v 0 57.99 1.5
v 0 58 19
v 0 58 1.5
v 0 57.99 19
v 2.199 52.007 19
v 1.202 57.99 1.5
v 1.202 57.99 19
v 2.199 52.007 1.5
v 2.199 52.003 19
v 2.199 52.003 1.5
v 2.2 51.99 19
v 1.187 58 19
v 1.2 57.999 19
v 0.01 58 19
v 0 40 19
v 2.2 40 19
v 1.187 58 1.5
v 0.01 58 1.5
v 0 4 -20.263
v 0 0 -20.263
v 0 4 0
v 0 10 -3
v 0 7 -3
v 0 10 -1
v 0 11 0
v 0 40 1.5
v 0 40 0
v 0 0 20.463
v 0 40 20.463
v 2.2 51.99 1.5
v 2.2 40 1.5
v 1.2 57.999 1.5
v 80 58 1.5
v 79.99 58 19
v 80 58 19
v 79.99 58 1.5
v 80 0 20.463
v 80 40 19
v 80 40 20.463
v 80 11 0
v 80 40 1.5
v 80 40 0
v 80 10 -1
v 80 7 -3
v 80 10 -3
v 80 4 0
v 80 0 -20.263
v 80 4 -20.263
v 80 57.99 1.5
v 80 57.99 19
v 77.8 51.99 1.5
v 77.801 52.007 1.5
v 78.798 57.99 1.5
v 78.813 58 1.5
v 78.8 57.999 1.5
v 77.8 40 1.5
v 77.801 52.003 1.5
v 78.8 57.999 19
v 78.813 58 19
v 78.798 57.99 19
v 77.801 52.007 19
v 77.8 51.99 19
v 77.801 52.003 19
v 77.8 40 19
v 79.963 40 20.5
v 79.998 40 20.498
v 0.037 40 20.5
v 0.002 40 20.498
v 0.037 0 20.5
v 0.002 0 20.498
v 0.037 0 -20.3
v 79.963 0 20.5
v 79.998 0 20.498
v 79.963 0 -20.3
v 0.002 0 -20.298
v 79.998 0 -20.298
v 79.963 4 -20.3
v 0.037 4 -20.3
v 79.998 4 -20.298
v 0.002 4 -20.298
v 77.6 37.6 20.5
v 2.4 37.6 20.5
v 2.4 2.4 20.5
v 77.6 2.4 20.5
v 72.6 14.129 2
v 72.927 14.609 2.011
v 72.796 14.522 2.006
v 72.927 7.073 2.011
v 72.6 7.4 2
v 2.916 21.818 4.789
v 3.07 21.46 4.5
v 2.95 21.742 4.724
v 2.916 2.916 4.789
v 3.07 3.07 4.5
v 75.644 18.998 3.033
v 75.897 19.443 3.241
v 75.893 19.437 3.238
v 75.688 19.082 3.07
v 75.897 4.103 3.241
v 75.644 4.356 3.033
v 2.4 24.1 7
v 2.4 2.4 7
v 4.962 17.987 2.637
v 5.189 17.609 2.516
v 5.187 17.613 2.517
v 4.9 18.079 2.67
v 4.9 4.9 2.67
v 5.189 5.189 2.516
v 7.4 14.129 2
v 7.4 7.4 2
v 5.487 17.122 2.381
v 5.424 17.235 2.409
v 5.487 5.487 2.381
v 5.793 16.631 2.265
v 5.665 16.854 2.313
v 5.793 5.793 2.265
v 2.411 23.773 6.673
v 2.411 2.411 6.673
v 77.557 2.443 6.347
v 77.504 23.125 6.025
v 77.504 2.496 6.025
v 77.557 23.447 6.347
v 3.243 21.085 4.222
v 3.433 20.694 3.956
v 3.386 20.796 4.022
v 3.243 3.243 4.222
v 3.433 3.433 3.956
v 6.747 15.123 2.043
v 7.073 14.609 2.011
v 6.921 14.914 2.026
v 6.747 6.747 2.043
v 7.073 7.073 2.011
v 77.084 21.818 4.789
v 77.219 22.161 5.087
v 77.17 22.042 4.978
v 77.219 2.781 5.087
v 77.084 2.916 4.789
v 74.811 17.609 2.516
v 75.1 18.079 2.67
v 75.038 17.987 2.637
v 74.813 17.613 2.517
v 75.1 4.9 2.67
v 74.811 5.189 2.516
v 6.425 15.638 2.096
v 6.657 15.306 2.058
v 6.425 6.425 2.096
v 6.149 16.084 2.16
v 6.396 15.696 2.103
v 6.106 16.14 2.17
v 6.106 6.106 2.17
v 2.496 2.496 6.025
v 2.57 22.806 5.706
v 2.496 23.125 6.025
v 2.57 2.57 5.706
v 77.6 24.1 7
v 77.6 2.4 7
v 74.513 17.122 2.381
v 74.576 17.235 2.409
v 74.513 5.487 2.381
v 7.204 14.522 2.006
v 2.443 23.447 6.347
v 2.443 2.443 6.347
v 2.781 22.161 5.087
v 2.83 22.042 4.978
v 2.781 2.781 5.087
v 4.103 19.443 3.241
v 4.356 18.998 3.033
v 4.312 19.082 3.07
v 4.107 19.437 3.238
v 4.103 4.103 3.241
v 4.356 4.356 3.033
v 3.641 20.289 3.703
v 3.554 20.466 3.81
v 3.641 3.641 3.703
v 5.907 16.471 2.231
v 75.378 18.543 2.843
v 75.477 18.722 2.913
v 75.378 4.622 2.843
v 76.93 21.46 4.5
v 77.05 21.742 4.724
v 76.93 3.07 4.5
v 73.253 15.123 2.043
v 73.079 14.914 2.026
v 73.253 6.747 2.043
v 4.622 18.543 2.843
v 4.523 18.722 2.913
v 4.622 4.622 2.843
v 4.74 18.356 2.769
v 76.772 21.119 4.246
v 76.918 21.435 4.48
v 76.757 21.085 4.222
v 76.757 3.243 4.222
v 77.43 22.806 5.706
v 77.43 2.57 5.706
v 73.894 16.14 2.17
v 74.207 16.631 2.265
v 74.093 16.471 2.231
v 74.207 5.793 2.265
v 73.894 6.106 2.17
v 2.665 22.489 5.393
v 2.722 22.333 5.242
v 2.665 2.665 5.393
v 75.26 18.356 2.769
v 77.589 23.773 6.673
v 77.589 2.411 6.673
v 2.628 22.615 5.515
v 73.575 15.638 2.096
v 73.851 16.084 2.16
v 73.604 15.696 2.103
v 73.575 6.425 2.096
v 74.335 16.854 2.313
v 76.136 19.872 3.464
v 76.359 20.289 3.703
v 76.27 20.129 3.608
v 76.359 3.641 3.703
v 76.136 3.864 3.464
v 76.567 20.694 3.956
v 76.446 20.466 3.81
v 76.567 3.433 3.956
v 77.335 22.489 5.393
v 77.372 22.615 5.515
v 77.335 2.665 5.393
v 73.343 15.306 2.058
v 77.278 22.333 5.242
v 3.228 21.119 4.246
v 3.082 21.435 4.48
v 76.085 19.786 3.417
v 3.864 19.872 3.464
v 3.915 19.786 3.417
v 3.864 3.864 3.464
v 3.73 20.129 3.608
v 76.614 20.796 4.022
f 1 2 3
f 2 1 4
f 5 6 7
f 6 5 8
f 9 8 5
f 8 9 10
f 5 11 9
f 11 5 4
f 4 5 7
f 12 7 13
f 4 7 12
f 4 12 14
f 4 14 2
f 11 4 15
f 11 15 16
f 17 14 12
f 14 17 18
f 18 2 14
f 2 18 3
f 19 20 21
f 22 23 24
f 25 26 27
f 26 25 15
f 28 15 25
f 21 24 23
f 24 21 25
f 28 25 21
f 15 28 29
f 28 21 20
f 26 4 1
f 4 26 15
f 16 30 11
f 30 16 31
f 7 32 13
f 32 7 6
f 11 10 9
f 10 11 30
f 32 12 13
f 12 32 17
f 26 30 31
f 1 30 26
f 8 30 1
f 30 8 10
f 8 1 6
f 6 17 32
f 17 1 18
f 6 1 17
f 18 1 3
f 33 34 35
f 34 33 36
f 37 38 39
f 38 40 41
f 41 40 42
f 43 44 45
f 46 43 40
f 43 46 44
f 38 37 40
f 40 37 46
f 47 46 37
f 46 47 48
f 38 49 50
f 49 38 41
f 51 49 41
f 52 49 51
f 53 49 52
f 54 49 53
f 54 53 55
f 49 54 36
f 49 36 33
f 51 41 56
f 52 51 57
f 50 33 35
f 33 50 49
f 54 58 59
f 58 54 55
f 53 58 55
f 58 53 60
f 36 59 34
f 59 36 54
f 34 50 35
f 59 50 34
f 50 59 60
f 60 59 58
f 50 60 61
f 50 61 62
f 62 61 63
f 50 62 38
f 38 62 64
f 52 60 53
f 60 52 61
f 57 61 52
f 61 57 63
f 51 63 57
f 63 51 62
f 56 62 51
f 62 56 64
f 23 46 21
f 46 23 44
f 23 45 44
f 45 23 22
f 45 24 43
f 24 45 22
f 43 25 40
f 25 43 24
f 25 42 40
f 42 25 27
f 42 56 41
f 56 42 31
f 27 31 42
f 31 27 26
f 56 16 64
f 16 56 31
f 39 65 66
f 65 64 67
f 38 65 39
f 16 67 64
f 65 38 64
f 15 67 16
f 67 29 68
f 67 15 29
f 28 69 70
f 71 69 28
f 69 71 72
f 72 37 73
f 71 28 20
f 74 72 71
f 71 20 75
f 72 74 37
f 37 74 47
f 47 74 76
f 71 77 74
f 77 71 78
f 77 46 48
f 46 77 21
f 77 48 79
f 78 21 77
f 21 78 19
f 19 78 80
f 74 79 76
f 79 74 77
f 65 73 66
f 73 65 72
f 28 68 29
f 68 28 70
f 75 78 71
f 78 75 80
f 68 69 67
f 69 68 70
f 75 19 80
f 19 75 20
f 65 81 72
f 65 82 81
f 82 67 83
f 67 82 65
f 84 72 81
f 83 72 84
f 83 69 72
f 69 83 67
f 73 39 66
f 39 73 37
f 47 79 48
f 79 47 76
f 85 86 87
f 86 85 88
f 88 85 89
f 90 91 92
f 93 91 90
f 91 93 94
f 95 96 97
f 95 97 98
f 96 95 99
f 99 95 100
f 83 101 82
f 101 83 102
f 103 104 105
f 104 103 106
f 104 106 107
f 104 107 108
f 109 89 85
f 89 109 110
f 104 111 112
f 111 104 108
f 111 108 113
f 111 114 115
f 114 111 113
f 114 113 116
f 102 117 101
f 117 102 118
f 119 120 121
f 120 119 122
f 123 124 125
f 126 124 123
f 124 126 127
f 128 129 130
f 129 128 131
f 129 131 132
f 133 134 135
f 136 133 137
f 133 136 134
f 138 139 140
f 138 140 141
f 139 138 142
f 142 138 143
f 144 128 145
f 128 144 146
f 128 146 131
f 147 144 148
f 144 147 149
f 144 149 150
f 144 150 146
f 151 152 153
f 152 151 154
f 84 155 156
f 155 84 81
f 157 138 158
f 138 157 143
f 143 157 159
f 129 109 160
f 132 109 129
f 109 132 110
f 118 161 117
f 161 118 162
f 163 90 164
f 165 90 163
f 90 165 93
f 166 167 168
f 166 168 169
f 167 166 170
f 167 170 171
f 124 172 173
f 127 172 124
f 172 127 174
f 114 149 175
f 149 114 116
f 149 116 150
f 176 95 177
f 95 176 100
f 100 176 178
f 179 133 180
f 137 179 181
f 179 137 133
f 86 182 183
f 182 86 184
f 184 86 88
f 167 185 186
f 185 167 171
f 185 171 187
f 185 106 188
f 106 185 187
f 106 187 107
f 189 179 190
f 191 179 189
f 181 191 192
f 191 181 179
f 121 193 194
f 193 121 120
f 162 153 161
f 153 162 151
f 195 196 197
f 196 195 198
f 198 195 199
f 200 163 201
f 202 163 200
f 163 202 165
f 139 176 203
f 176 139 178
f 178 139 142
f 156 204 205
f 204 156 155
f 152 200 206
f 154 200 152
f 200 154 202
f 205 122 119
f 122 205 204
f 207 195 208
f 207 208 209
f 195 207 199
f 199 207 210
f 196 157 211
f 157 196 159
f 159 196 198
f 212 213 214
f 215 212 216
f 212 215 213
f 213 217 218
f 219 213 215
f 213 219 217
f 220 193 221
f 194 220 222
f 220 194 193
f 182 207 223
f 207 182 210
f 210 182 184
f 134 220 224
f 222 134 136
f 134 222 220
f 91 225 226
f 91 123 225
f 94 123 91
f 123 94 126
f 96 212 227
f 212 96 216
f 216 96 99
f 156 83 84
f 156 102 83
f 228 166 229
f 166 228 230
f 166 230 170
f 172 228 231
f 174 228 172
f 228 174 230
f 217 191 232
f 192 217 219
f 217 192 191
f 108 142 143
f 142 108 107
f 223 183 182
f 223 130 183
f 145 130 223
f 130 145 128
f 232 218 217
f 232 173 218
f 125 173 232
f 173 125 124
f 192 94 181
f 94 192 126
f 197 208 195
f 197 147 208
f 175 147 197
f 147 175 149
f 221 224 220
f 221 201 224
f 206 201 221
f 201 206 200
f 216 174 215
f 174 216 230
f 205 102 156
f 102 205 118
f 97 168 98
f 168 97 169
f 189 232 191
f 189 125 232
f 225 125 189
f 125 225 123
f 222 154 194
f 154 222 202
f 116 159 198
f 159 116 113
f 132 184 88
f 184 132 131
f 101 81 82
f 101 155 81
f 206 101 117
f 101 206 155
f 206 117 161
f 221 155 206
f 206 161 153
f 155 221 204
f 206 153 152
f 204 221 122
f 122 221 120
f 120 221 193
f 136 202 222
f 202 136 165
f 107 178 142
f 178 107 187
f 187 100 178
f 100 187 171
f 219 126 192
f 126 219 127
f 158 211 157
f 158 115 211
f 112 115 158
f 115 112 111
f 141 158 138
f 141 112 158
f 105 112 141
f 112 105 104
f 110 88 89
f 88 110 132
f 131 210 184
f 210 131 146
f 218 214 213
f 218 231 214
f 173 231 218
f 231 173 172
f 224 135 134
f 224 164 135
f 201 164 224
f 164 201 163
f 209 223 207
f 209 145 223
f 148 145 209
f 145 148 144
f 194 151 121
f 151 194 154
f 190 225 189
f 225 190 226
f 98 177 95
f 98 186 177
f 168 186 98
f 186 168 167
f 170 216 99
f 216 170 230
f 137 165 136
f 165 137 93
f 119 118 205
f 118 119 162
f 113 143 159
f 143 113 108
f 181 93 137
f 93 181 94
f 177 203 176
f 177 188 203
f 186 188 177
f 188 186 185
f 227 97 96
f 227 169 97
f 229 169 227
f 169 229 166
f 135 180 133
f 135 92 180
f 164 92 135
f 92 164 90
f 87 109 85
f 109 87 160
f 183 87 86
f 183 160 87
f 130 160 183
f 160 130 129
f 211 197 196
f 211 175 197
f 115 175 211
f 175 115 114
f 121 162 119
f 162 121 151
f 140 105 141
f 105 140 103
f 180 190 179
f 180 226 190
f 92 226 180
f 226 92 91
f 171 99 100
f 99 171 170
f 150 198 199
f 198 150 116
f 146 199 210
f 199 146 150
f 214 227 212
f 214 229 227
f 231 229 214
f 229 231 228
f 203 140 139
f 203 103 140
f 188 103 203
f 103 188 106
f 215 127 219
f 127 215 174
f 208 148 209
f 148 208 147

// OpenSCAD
// ============================================================================
//  Coffee spill tray for the internet connected coffee pot scale
//
//  A shallow open trough that catches the drips that run down the pot and out
//  across the plate. It rests on the free part of the teak plate in front of the
//  load cell holder and reaches plate_depth mm in towards the holder. The front
//  overhang mm stick out past the front edge of the plate, so drips that run all
//  the way over the edge are caught too instead of ending up on the table.
//
//  The load cell sits up inside the big grey cup the pot stands in, so the teak
//  plate and the table are both dead support below the measuring path. The tray
//  may therefore rest on the table as well, and that is what it does: the front
//  wall carries on down past the plate edge and stands on the table, which
//  stiffens the overhang. Three things hold the tray on the rig:
//
//    * a tongue behind the leg, hanging down in front of the front face of the
//      plate, so the tray cannot slide backwards towards the pot
//    * two spring arms reaching backwards from the rear face, one along each
//      side of the grey printed socle that carries the sensor, gripping it by
//      friction when the tray is pushed on
//    * its own weight on the plate
//
//  THE GREY SOCLE is the fixed 3D printed block standing on the teak plate
//  behind the tray: socle_width mm wide, socle_height mm up from the plate and
//  deep. That is what the arms grip - the sides of a block that stands up above
//  the plate - so the arms simply continue the side walls backwards, set in
//  (tray_width - socle_width) / 2 mm from the sides of the tray. The tray
//  therefore stays exactly tray_width mm wide.
//
//  PRINT ORIENTATION: on the front face (mode = "print"), so the print axis runs
//  backwards along the depth of the tray. That is what makes the arms possible.
//  Both gripping faces are planes at constant x; standing the part on a short end
//  would put the print axis along x, turning those planes into layer planes, and
//  the inner face of the upper arm into a ceiling hanging over nothing. Standing
//  the tray upright is worse: the whole underside would be a ceiling 30 x 80 mm
//  in the air above the leg.
//
//  Lying on the front face, every face that has to be vertical runs parallel to
//  the print axis, and the whole front face is the first layer. Only two surfaces
//  face the bed, and both are dealt with at 45 degrees, the steepest overhang
//  that prints without support:
//
//    * the inside of the rear wall - the floor rises to the rim over a fillet of
//      radius rear_fillet, from horizontal up to 45 degrees, and then a straight
//      45 degree run. This also makes the trough deepest at the front, so a spill
//      collects out over the table edge, away from the rig.
//    * the front face of the locating tongue - chamfered at 45 degrees
//
//  The short ends need no such treatment in this orientation - they are prisms
//  along the print axis - so their inside is a plain fillet and the flat floor
//  keeps its full width.
//
//  The STL files are written like this - see README.md for the reasoning:
//
//    openscad -o stl/coffee_spill_mug.stl -D 'mode="print"' coffee_spill_mug.scad
//    openscad -o stl/coffee_spill_mug_gauge.stl       -D 'mode="gauge"'       coffee_spill_mug.scad
//    openscad -o stl/coffee_spill_mug_gauge_clamp.stl -D 'mode="gauge_clamp"' coffee_spill_mug.scad
//    openscad -o stl/coffee_spill_mug_clip.stl        -D 'mode="clip"'        coffee_spill_mug.scad
//
//  Origin: x = 0 is the left side of the tray body, y = 0 is the front face (the
//  one out over the table), z = 0 is the top surface of the plate and
//  z = -plate_height is the table. All units in mm.
// ============================================================================

/* [Main dimensions] */
tray_width  = 80;   // body width, along the front edge of the plate, and the
                    // widest point of the whole part: the spring arms are set in
                    // from the sides, they do not stand outside them.
plate_depth = 30;   // how far in on the plate the tray reaches, measured from
                    // the front edge of the plate towards the sensor holder
tray_height = 20.5; // height of the rim above the plate surface. The grey socle
                    // is socle_height = 22 mm, and there are several mm of air
                    // from its top up to the big grey cup the pot stands in, so
                    // the rim has room to spare. Fitted with the 2 mm gauge.
overhang    = 10;   // how far the tray sticks out past the front edge of the plate

/* [The rig we clamp on to] */
// The grey 3D printed socle that carries the sensor, standing on the teak plate
// right behind the tray. Measured with the caliper.
socle_width  = 76;  // across, at the front face of the socle
socle_height = 22;  // up from the top of the teak plate
socle_depth  = 76;  // backwards - not measured exactly, "a lot", about this

/* [Wall thickness] */
wall_t  = 2.4;      // side, front and rear walls
floor_t = 2.0;      // floor of the trough (the part lying on the plate)

/* [Inside of the trough] */
// The inside of the rear wall faces the bed when printed, so the floor rises to
// the rim there over rear_fillet plus a straight 45 degree run. That costs
// (tray_height - floor_t) + 0.41 * rear_fillet mm of the depth. The front wall
// and the two short ends only get inner_fillet, a plain rounding that makes the
// trough easy to wipe out - no 45 degree run needed, none of those surfaces
// faces the bed.
rear_fillet  = 12;
inner_fillet = 5;
arc_steps    = 24;  // facets in the fillets

/* [Leg down to the table] */
// The front wall carries on down past the front edge of the plate and stands on
// the table, so the overhang is supported instead of cantilevered. plate_height
// is measured from the table up to the top surface of the teak plate. foot_clear
// shortens the leg a little: the tray pivots on the plate edge, so a leg that is
// e mm too long lifts the rear edge by 3 e mm and eats into the clearance under
// the grey cup. 0.3 mm is enough that the leg still takes over as soon as
// anything presses on the overhang.
//
// NOTE: the teak plate itself measures 19 mm thick. plate_height is 1.6 mm more
// than that because it was fitted with the printed gauge - the plate does not
// lie flat on the table. If the new gauge shows the leg standing the tray on its
// heel, set plate_height = 19.3.
leg_enable   = true;
plate_height = 20.6;
foot_clear   = 0.3;
leg_t        = 4;   // thickness of the leg below the plate. Thicker than the
                    // front wall on purpose: with edge_r = 1.5 a 2.4 mm leg
                    // would be rounded away to a knife edge against the table,
                    // 4 mm leaves a flat foot to bear on.

/* [Locating tongue at the plate edge] */
// A short tongue behind the leg, hanging down in front of the front face of the
// plate, so the tray cannot slide backwards towards the pot. Its front face
// would be a ceiling in the print, so it is chamfered at 45 degrees. The chamfer
// starts at the back of the leg, which caps hook_depth at hook_front - leg_t.
hook_enable = true;
hook_depth  = 3;
hook_t      = 3;    // thickness of the tongue
hook_relief = 1.0;  // 45 degree relief in the inner corner, so a rounded or
                    // slightly chamfered plate edge still seats fully

/* [Side spring clamps] */
// One on each side: the side wall carried on backwards past the rear face as a
// leaf spring clamp_len mm long, clamp_t mm thick, standing along the side of the
// grey socle. The outer face is flush with the side of the tray and the inner
// face is the gripping face, so the pair of them is clamp_squeeze mm narrower
// than the socle and has to spread to let it in.
//
// Bending happens over the whole free length, which is what makes the grip
// springy instead of brittle: about 3.2 N per side at the numbers below, with a
// peak stress around 4 MPa - a twelfth of what PETG takes. clamp_squeeze is the
// total interference over both sides and is the number to tune if the grip is
// too weak or the tray is too hard to push on.
//
// The gripping face is relieved clamp_lead mm at the free end and closes in on
// the socle over clamp_lead_y mm, so the front corners of the socle wedge the
// arms apart instead of hitting them head on.
clamp_enable  = true;
clamp_squeeze = 0.4;    // total, i.e. clamp_squeeze / 2 per side
clamp_t       = 2.2;    // thickness of the arm - this is the spring. Equal to
                        // (tray_width - socle_width + clamp_squeeze) / 2 makes
                        // the outer face flush with the side of the tray.
clamp_len     = 18;     // free length backwards from the rear face
clamp_z0      = 1.5;    // the arm starts this far above the plate, to clear any
                        // fillet or elephant foot at the base of the socle
clamp_h       = 19;     // top of the arm above the plate = tray_height - edge_r.
                        // Any higher and the rounding of the rim would thin the
                        // top of the arm down to a knife edge.
clamp_lead    = 1.0;    // relief of the gripping face at the free end
clamp_lead_y  = 6;      // ... closing in on the socle over this length
clamp_r       = 0.4;    // rounding of the free end of the arm

/* [Rim] */
edge_r = 1.5;       // rounding of the four long outer edges. The front and rear
                    // faces are left sharp on purpose: the front face is the
                    // first layer and wants full contact with the bed.

/* [View] */
// "use"    = as it sits on the plate (z = 0 is the plate surface)
// "print"  = lying on the front face, ready for the slicer
// "check"  = as "use", with the plate, the grey socle and the table as ghosts
// "gauge"  = a thin slice of the cross section, lying flat, ready for the slicer
// "gauge_clamp" = the top clamp_gauge_t mm of the tray, i.e. the rim and the two
//            arms: the cheap check that the arms straddle the socle
// "clip"   = the rear clip_back mm of the tray plus both complete arms, in print
//            orientation: the real friction test - see README.md
// "cavity" = the trough volume up to the rim, as a solid (for measuring it)
mode = "use";

gauge_t   = 2;   // thickness of the mode = "gauge" slice
clip_back = 12;  // how much of the tray the mode = "clip" test piece takes along

// mode = "gauge_clamp" keeps a clamp_gauge_t mm slice of the tray at the top of
// the arms. That is a ring of wall all the way round plus the top slice of both
// arms, held apart at the right spacing, and it is already flat - the cheapest
// possible check that the arms straddle the socle. Note that the spring force
// scales with the height of the arm, so a 1.5 mm slice pinches roughly
// clamp_gauge_t / (clamp_h - clamp_z0) = 1/12 as hard as the finished tray.
// Judge the fit here and the friction from mode = "clip".
clamp_gauge_t = 1.5;

$fn = 64;

// ---------------------------------------------------------------------------
//  Derived values
// ---------------------------------------------------------------------------
tray_depth = overhang + plate_depth;        // total depth of the tray body
cav_rise   = tray_height - floor_t;         // depth of the trough
table_z    = -(plate_height - foot_clear);  // where the foot of the leg ends up
hook_front = overhang - hook_t;             // front face of the locating tongue
hook_lead  = hook_front - hook_depth;       // where its 45 degree chamfer starts

cav_y0 = wall_t;                            // inside of the front wall
cav_y1 = tray_depth - wall_t;               // inside of the rear wall
cav_x0 = wall_t;                            // inside of the left short end
cav_x1 = tray_width - wall_t;               // inside of the right short end

// Depth eaten by the rear ramp: a fillet from horizontal up to 45 degrees, then
// a straight 45 degree line that hits the rim exactly at the inside of the wall
rear_run  = rear_fillet * sin(45) + (cav_rise - rear_fillet * (1 - cos(45)));
flat_rear = cav_y1 - rear_run;              // where the rear ramp leaves the floor

socle_x0 = (tray_width - socle_width) / 2;  // left side of the grey socle
grip_x   = socle_x0 + clamp_squeeze / 2;    // gripping face of the left arm
arm_x0   = grip_x - clamp_t;                // outer face of the left arm
arm_end  = tray_depth + clamp_len;          // free end of the arms
part_w   = tray_width - 2 * min(arm_x0, 0); // widest point of the whole part
part_d   = clamp_enable ? arm_end : tray_depth;
clip_y0  = tray_depth - clip_back;          // cut plane of the mode = "clip" piece

assert(cav_rise > rear_fillet * (1 - cos(45)),
       "rear_fillet too large for the depth of the trough");
assert(flat_rear > cav_y0 + inner_fillet,
       "no flat floor left - reduce rear_fillet, inner_fillet or plate_depth");
assert(2 * inner_fillet < cav_x1 - cav_x0, "inner_fillet too large for the width");
assert(!hook_enable || hook_lead >= leg_t,
       "the 45 degree chamfer on the tongue starts inside the leg - reduce hook_depth");
assert(!hook_enable || !leg_enable || hook_depth < plate_height - foot_clear,
       "the locating tongue reaches below the foot of the leg - reduce hook_depth");
assert(socle_width < tray_width,
       "the socle is wider than the tray - the arms cannot reach around it");
assert(!clamp_enable || arm_x0 >= -0.01,
       "the arms stand outside the sides of the tray - reduce clamp_t");
assert(!clamp_enable || clamp_t > 1.6,
       "clamp_t below 1.6 mm is thinner than two perimeters - the spring is too weak");
assert(!clamp_enable || clamp_h <= socle_height + 1,
       "the arms stand taller than the socle - reduce clamp_h");
assert(!clamp_enable || clamp_h <= tray_height - edge_r,
       "the rim rounding would thin the top of the arms - reduce clamp_h");
assert(!clamp_enable || clamp_z0 + 5 < clamp_h, "no arm left - reduce clamp_z0");
assert(!clamp_enable || clamp_len <= socle_depth,
       "the arms reach past the back of the socle - reduce clamp_len");
assert(!clamp_enable || clamp_lead_y < clamp_len, "clamp_lead_y longer than the arm");
assert(!clamp_enable || 2 * clamp_r < clamp_t - clamp_lead,
       "clamp_r too large for the tip of the arm");
assert(!clamp_enable || grip_x - clamp_lead < socle_x0,
       "the mouth of the arms is narrower than the socle - increase clamp_lead");
assert(clip_back > wall_t, "clip_back must reach in front of the rear wall");

echo(str("Tray ", tray_width, " x ", tray_depth, " x ", tray_height,
         " mm over the plate, ", tray_height - table_z, " mm over the table"));
echo(str("Flat floor ", cav_x1 - cav_x0 - 2 * inner_fillet, " x ",
         flat_rear - cav_y0 - inner_fillet, " mm, trough ", cav_rise, " mm deep"));
echo(str("Arms ", clamp_t, " x ", clamp_h - clamp_z0, " mm, ", clamp_len,
         " mm long, gripping at x = ", grip_x, " and ", tray_width - grip_x,
         ": ", clamp_squeeze, " mm total interference on the ", socle_width,
         " mm socle, mouth ", socle_width - clamp_squeeze + 2 * clamp_lead,
         " mm at the tip"));
echo(str("Print footprint ", part_w, " x ", tray_height - table_z,
         " mm, ", part_d, " mm tall"));

// ---------------------------------------------------------------------------
//  Helpers
// ---------------------------------------------------------------------------

// Rounds every convex corner of a 2D shape with radius r, leaves the concave
// ones sharp (the inner corner at the plate edge has to stay square).
module round2d(r) {
    if (r > 0) offset(r = -r) offset(r = r) children();
    else children();
}

// Places a 2D shape drawn in (y, z) and extrudes it along x, from x0 to x0 + len
module extrude_x(x0, len) {
    translate([x0, 0, 0]) rotate([0, 0, 90]) rotate([90, 0, 0])
        linear_extrude(height = len) children();
}

// Places a 2D shape drawn in (x, z) and extrudes it along y, from y0 to y0 + len.
// Anything built this way is a prism along the print axis: no overhang at all.
module extrude_y(y0, len) {
    translate([0, y0 + len, 0]) rotate([90, 0, 0]) linear_extrude(height = len)
        children();
}

function reverse(v) = [for (i = [len(v) - 1 : -1 : 0]) v[i]];

// A quarter fillet of radius r, tangent to the floor at distance r from the
// wall. Points run from the wall (top of the fillet) down to the floor.
function fillet_up(wall, dir, r, floor) =
    [for (i = [0 : arc_steps])
        let (a = 90 * i / arc_steps)
        [wall + dir * r * (1 - cos(a)), floor + r * (1 - sin(a))]];

// ---------------------------------------------------------------------------
//  Cross section of the body, in (y, z). y = 0 is the front face, y = overhang
//  is the front face of the plate, z = 0 is the top of the plate and
//  z = table_z is the table. Traversed from the foot of the leg, backwards along
//  the underside, up the rear face and forwards along the rim.
// ---------------------------------------------------------------------------
function body_section() = concat(
    leg_enable
    ? [[0, table_z],                        // outer bottom corner of the leg
       [leg_t, table_z],                    // inner bottom corner of the leg
       [leg_t, 0]]                          // up the back of the leg
    : [[0, 0]],
    hook_enable
    ? concat(hook_lead > leg_t ? [[hook_lead, 0]] : [],
             [[hook_front, -hook_depth],    // bottom front corner of the tongue,
                                            // reached at 45 degrees from the leg
              [overhang, -hook_depth],      // bottom of the tongue
              [overhang, -hook_relief],     // inside of the tongue, on the plate edge
              [overhang + hook_relief, 0]]) // relief in the inner corner
    : [],
    [[tray_depth, 0],                       // underside, resting on the plate
     [tray_depth, tray_height],             // rear face
     [0, tray_height]]);                    // rim, back to the front face

// The four long outer edges of body and arms alike, rounded. A prism along the
// print axis, so the rounding is free; the front and rear faces stay sharp.
module rounded_bounds() {
    extrude_y(-1, part_d + 2) round2d(edge_r)
        translate([0, table_z]) square([tray_width, tray_height - table_z]);
}

// ---------------------------------------------------------------------------
//  The trough. Two profiles intersected: one across the width, with a plain
//  fillet at each short end, and one along the depth, with the 45 degree rear
//  ramp. Both are left open above the rim.
// ---------------------------------------------------------------------------
function end_profile() = concat(
    [[cav_x0, tray_height + 1]],
    fillet_up(cav_x0, +1, inner_fillet, floor_t),
    reverse(fillet_up(cav_x1, -1, inner_fillet, floor_t)),
    [[cav_x1, tray_height + 1]]);

// The rear ramp: tangent to the floor at flat_rear, curving up to 45 degrees
// over rear_fillet, then straight at 45 degrees through the rim
function rear_ramp() = concat(
    [for (i = [0 : arc_steps])
        let (a = 45 * i / arc_steps)
        [flat_rear + rear_fillet * sin(a), floor_t + rear_fillet * (1 - cos(a))]],
    [[cav_y1 + 1, tray_height + 1]]);

function rear_profile() = concat(
    [[cav_y0, tray_height + 1]],
    fillet_up(cav_y0, +1, inner_fillet, floor_t),
    rear_ramp());

module trough() {
    intersection() {
        extrude_y(cav_y0, cav_y1 - cav_y0) polygon(end_profile());
        extrude_x(-1, tray_width + 2) polygon(rear_profile());
    }
}

// ---------------------------------------------------------------------------
//  The side spring clamps. One arm is a flat plate in the (x, y) plane extruded
//  in z, so every gripping face is parallel to the print axis and comes out
//  exactly as drawn. It starts inside the rear wall, at cav_y1, so the union
//  with the body is a solid overlap and not two faces meeting.
//  Drawn for the left side; the right one is mirrored.
// ---------------------------------------------------------------------------
function arm_plan() = [
    [arm_x0, cav_y1],                       // buried in the rear wall
    [grip_x, cav_y1],
    [grip_x, arm_end - clamp_lead_y],       // the gripping face
    [grip_x - clamp_lead, arm_end],         // relieved towards the free end
    [arm_x0, arm_end]                       // outer face, flush with the tray
];

module clamp() {
    translate([0, 0, clamp_z0])
        linear_extrude(height = clamp_h - clamp_z0)
            round2d(clamp_r) polygon(arm_plan());
}

module clamps() {
    for (m = [0, 1])
        translate([m * tray_width, 0, 0]) scale([m ? -1 : 1, 1, 1]) clamp();
}

// ---------------------------------------------------------------------------
//  The tray
// ---------------------------------------------------------------------------
module coffee_spill_tray() {
    difference() {
        intersection() {
            union() {
                extrude_x(0, tray_width) polygon(body_section());
                if (clamp_enable) clamps();
            }
            rounded_bounds();
        }
        trough();
    }
}

// The teak plate, the grey socle and the table, drawn only in mode = "check"
module ghost_rig() {
    %translate([-0.05, overhang, -plate_height])           // teak plate, 80.1 wide
        cube([tray_width + 0.1, plate_depth + 100, plate_height]);
    %translate([socle_x0, tray_depth, 0])                  // the grey socle
        cube([socle_width, socle_depth, socle_height]);
    %translate([-40, -30, -plate_height - 2])              // the table
        cube([tray_width + 80, plate_depth + 160, 2]);
}

// Lays the part down on its front face, the way it is printed
module on_front_face() {
    translate([0, tray_height, 0]) rotate([90, 0, 0]) children();
}

if (mode == "print")
    on_front_face() coffee_spill_tray();
else if (mode == "gauge")
    // The cross section laid flat in the xy plane: x is the depth of the tray,
    // y is the height over the table
    translate([0, -table_z, 0]) linear_extrude(height = gauge_t)
        polygon(body_section());
else if (mode == "gauge_clamp")
    // A slice at the top of the arms - wall ring plus both arms - already flat,
    // just dropped down onto the bed
    translate([0, 0, clamp_gauge_t - clamp_h]) intersection() {
        coffee_spill_tray();
        translate([-50, -50, clamp_h - clamp_gauge_t])
            cube([tray_width + 100, part_d + 100, clamp_gauge_t]);
    }
else if (mode == "clip")
    // The rear clip_back mm of the tray plus both complete arms, standing on the
    // cut plane the same way the whole tray stands on its front face
    translate([0, 0, -clip_y0]) on_front_face() intersection() {
        coffee_spill_tray();
        translate([-50, clip_y0, -50])
            cube([tray_width + 100, part_d - clip_y0, 100]);
    }
else if (mode == "cavity")
    intersection() {
        trough();
        translate([-1, -1, -1]) cube([tray_width + 2, tray_depth + 2, tray_height + 1]);
    }
else {
    coffee_spill_tray();
    if (mode == "check") ghost_rig();
}
